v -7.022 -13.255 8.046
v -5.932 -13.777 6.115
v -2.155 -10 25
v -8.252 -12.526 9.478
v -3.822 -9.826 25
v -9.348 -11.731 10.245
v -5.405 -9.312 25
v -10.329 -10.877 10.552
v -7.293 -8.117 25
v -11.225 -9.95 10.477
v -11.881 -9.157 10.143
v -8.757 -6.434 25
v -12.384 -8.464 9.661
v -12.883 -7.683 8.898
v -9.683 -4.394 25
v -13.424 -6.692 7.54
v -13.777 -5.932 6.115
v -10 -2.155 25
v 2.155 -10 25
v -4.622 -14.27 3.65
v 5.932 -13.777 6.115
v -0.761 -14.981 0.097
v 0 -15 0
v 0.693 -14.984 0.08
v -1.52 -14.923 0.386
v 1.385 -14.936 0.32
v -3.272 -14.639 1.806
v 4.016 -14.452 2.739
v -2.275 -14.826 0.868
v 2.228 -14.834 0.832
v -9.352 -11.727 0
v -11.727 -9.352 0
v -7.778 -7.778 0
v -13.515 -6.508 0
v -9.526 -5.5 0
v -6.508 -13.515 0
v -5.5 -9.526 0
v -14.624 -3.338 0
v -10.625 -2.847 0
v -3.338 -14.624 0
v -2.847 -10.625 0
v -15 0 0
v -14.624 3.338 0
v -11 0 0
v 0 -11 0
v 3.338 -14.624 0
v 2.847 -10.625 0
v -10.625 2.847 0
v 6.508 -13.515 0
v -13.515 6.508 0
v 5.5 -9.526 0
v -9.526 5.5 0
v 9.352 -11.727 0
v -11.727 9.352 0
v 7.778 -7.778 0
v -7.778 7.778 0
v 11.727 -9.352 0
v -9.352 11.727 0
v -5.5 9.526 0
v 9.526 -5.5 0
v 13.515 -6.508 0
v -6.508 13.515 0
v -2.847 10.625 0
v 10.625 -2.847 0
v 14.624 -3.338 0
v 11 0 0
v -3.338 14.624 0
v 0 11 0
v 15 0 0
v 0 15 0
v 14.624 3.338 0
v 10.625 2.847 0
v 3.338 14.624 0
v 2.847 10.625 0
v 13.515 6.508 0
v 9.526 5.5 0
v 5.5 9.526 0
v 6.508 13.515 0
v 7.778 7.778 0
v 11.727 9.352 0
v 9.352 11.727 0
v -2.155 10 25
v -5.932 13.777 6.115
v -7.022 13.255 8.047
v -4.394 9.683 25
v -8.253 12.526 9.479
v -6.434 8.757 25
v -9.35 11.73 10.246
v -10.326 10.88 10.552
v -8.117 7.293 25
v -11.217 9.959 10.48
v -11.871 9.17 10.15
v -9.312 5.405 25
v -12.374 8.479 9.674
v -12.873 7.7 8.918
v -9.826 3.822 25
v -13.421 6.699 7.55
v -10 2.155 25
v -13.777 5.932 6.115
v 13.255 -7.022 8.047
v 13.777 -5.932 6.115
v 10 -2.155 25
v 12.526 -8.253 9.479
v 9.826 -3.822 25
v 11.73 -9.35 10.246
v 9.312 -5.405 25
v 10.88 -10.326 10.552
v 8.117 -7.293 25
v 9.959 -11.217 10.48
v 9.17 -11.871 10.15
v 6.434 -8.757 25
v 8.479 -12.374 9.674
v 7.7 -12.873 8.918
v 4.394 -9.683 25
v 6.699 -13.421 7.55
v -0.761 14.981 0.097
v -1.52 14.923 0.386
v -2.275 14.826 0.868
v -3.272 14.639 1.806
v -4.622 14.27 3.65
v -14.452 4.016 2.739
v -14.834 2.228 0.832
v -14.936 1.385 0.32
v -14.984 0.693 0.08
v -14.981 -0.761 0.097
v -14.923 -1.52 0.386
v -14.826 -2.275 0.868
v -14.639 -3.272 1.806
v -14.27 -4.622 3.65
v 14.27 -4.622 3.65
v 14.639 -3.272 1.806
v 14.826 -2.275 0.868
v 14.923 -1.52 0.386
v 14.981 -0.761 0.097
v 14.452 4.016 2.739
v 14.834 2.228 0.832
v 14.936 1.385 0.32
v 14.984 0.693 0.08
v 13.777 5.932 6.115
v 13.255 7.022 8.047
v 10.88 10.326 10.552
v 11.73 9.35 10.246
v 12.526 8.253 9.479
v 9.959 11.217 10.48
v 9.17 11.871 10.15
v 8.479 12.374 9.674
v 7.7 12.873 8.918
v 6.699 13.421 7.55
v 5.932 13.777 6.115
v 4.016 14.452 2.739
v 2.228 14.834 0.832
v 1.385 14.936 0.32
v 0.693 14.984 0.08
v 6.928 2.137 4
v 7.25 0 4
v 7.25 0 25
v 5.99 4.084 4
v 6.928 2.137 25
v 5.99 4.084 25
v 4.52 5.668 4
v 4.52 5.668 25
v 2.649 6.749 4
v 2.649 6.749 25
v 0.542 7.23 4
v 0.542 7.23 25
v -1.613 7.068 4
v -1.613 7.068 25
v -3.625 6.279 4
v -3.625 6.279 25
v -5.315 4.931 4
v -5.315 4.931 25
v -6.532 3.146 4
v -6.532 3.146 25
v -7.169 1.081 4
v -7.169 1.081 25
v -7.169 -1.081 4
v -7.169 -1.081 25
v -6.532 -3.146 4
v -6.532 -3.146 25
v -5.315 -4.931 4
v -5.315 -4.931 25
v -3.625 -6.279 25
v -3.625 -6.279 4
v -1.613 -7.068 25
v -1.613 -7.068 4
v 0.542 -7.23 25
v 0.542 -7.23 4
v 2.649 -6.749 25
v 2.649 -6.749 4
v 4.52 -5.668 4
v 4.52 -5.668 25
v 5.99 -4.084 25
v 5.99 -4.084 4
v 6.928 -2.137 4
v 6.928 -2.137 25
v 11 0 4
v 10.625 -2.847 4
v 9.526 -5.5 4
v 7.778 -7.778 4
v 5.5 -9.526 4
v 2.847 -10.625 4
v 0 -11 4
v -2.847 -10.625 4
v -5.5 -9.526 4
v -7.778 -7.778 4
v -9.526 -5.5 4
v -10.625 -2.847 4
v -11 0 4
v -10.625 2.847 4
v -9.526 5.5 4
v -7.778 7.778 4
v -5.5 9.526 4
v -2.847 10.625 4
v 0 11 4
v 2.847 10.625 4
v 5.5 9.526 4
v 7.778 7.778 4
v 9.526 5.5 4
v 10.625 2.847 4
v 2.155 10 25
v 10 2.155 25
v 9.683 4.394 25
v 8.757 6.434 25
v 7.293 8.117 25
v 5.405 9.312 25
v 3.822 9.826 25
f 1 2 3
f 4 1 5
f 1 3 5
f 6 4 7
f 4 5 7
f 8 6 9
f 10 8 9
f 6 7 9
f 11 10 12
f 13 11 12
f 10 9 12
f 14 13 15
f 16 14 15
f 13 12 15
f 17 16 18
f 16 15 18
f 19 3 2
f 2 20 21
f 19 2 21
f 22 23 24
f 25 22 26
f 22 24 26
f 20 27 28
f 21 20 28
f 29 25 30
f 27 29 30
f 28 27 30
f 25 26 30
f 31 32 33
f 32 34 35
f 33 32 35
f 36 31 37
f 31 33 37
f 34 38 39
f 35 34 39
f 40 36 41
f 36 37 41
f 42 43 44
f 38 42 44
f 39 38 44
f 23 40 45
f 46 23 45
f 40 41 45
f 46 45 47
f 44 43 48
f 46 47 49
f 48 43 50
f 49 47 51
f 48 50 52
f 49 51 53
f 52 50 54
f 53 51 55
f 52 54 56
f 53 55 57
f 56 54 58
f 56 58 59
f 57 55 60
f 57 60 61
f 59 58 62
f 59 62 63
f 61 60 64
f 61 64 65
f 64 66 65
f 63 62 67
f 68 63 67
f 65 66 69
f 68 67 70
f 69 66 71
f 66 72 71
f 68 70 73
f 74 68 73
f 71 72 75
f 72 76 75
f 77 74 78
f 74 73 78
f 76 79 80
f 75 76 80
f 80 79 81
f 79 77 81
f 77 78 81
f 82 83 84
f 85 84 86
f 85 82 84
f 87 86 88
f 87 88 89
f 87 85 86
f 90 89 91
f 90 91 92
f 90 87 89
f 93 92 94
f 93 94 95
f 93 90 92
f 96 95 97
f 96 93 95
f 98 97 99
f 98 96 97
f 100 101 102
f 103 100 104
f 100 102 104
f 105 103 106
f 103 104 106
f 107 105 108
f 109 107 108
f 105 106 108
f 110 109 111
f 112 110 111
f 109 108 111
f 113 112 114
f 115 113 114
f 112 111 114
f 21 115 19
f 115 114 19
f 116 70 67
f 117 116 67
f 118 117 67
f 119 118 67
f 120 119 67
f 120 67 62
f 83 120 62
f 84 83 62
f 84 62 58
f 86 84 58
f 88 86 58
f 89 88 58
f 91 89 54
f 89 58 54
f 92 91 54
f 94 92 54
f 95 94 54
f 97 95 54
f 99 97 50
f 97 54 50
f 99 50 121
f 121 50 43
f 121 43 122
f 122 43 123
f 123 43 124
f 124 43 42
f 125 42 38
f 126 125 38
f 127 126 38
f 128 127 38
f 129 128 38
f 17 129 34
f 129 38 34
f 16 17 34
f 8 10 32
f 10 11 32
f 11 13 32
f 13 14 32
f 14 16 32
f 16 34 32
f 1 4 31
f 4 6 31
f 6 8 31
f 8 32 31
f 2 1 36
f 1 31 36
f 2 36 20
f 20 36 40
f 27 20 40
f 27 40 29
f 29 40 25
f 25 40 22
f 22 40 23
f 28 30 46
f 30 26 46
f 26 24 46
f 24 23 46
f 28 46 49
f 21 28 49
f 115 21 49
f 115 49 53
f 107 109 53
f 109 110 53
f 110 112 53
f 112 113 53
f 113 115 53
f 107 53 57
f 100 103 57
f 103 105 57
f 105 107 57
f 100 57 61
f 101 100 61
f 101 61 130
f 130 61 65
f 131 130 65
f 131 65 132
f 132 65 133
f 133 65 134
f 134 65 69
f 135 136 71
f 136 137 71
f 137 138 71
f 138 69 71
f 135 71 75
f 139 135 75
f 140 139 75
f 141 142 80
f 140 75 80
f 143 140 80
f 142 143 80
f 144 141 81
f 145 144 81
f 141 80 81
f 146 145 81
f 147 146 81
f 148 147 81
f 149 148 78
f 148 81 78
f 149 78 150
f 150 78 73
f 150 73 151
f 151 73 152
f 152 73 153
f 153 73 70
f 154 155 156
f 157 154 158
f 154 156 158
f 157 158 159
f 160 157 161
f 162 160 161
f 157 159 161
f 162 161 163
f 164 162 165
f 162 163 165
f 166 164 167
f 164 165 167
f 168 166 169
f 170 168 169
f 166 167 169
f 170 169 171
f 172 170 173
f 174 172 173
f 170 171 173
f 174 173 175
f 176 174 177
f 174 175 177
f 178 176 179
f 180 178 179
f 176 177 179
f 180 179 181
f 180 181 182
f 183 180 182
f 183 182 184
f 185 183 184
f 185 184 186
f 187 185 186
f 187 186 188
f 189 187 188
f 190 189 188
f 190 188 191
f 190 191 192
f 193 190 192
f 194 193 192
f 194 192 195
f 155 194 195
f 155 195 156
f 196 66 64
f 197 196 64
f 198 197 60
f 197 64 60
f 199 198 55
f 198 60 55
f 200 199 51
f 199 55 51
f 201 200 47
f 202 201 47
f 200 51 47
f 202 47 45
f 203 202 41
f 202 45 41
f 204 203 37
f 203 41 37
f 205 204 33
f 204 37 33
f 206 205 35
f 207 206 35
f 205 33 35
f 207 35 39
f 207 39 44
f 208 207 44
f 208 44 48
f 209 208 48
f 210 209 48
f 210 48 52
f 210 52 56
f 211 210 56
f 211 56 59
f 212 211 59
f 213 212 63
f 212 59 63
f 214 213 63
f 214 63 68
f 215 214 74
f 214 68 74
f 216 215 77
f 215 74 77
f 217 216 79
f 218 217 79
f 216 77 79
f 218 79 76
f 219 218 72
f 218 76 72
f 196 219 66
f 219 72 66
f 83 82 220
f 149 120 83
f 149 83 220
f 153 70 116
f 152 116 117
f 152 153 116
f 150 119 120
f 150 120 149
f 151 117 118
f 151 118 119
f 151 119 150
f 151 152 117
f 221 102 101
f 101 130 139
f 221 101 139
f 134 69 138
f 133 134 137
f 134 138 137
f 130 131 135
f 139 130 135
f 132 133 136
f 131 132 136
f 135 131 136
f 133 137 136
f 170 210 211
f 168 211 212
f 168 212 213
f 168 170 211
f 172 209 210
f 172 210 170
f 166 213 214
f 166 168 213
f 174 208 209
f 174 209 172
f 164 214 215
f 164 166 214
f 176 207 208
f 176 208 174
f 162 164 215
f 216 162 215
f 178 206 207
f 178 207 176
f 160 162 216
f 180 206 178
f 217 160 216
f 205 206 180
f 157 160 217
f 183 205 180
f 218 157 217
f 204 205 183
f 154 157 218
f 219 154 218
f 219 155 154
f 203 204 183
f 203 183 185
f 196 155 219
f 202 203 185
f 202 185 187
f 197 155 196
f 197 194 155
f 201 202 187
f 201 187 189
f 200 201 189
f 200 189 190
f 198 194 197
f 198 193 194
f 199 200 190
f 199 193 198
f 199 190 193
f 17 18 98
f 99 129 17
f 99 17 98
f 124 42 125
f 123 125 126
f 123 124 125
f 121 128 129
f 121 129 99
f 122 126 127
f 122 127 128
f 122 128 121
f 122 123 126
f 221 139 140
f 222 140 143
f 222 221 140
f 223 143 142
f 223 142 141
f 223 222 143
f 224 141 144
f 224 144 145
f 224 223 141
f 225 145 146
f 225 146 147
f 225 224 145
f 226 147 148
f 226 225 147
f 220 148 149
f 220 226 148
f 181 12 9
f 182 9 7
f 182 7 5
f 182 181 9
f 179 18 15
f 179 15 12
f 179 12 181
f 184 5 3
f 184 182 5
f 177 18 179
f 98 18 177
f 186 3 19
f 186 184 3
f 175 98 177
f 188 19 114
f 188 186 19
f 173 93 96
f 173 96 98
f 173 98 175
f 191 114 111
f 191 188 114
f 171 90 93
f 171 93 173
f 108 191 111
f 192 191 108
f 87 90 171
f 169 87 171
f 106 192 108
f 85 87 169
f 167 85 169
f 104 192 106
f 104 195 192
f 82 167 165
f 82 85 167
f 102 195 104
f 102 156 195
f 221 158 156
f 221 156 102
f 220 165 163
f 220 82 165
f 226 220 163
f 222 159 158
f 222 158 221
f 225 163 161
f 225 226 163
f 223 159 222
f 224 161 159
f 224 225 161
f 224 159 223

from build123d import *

# Parameters (mm, degrees)
F0_W        = 30
F0_H        = 30
F1_DEPTH    = 25
F2_R        = 7.25
F3_DEPTH    = 25
F4_SIZE2    = 24.99999
F4_SIZE     = 4.99999
F5_T1_DEPTH = 102.9607936575
F5_T3_DEPTH = 102.9607936575
F5_T5_DEPTH = 102.9607936575
F5_T7_DEPTH = 102.9607936575
F7_DEPTH    = 25
F8_R        = 11
F9_DEPTH    = 4


# Not quite as in the source:
# - a fillet or chamfer that OpenCascade refuses, or shapes differently, is made with other operations: its cross-section is extruded or revolved along the edge and cut away or added
# - a fillet or chamfer is up to 0.001 mm smaller than in the source, because OpenCascade refuses the exact size


with BuildPart() as f1:
    # F0 (on Top) → F1 (new body)
    with BuildSketch(Plane.XY):
        Rectangle(F0_W, F0_H)
    extrude(amount=F1_DEPTH)

    # F2 (on face) → F3 (cut)
    with BuildSketch(Plane.XY.offset(25)):
        Circle(F2_R)
    extrude(amount=-F3_DEPTH, mode=Mode.SUBTRACT)

    # F4 (size 5 and 25 in the source; OpenCascade refuses exactly that, so slightly less here)
    f4_edges = [f1.edges().sort_by_distance(p)[0] for p in [
        (15, 0, 25),
        (0, 15, 25),
        (-15, 0, 25),
        (0, -15, 25),
    ]]
    f4_side = f1.faces().sort_by_distance((14.575736, 0, 25))[0]
    chamfer(f4_edges, length=F4_SIZE, length2=F4_SIZE2, reference=f4_side)

    # F5: fillet of radius 8 on 4 edges, made by hand

    # F5_s2 → F5_t1 (cut)
    with BuildSketch(Plane(origin=(-7.5925826886, 7.5925826886, 37.9629741838), x_dir=(0.7071067812, 0.7071067812, 0), z_dir=(0.1924498046, -0.1924498046, -0.9622505627))):
        with BuildLine():
            ThreePointArc((5.5470023036, 15.0748135762), (0, 17.3102003677), (-5.5470023036, 15.0748135762))
            Line((-5.5470023036, 15.0748135762), (0, 20.4124196641))
            Line((0, 20.4124196641), (5.5470023036, 15.0748135762))
        make_face()
    extrude(amount=F5_T1_DEPTH, mode=Mode.SUBTRACT)

    # F5_s4 → F5_t3 (cut)
    with BuildSketch(Plane(origin=(-7.5925826886, -7.5925826886, 37.9629741838), x_dir=(-0.7071067812, 0.7071067812, 0), z_dir=(0.1924498046, 0.1924498046, -0.9622505627))):
        with BuildLine():
            ThreePointArc((-5.5470023036, 15.0748135762), (0, 17.3102003677), (5.5470023036, 15.0748135762))
            Line((5.5470023036, 15.0748135762), (0, 20.4124196641))
            Line((0, 20.4124196641), (-5.5470023036, 15.0748135762))
        make_face()
    extrude(amount=F5_T3_DEPTH, mode=Mode.SUBTRACT)

    # F5_s6 → F5_t5 (cut)
    with BuildSketch(Plane(origin=(7.5925826886, -7.5925826886, 37.9629741838), x_dir=(-0.7071067812, -0.7071067812, 0), z_dir=(-0.1924498046, 0.1924498046, -0.9622505627))):
        with BuildLine():
            ThreePointArc((-5.5470023036, 15.0748135762), (0, 17.3102003677), (5.5470023036, 15.0748135762))
            Line((5.5470023036, 15.0748135762), (0, 20.4124196641))
            Line((0, 20.4124196641), (-5.5470023036, 15.0748135762))
        make_face()
    extrude(amount=F5_T5_DEPTH, mode=Mode.SUBTRACT)

    # F5_s8 → F5_t7 (cut)
    with BuildSketch(Plane(origin=(7.5925826886, 7.5925826886, 37.9629741838), x_dir=(0.7071067812, -0.7071067812, 0), z_dir=(-0.1924498046, -0.1924498046, -0.9622505627))):
        with BuildLine():
            ThreePointArc((5.5470023036, 15.0748135762), (0, 17.3102003677), (-5.5470023036, 15.0748135762))
            Line((-5.5470023036, 15.0748135762), (0, 20.4124196641))
            Line((0, 20.4124196641), (5.5470023036, 15.0748135762))
        make_face()
    extrude(amount=F5_T7_DEPTH, mode=Mode.SUBTRACT)

    # F6 (on face) → F7 (cut)
    with BuildSketch(Plane(origin=(0, 0, 0), x_dir=(1, 0, 0), z_dir=(0, 0, -1))):
        with BuildLine():
            ThreePointArc((0, 15), (10.6066017178, 10.6066017178), (15, 0))
            Line((15, 0), (15, 7.1610644072))
            add(Edge.make_bspline(
                [(7.1610644072, 15), (14.9945107468, 14.9945107468), (15, 7.1610644072)],
                knots=[2.3761301528, 2.3761301528, 2.3761301528, 3.9070551544, 3.9070551544, 3.9070551544], degree=2, weights=[1, 0.7210619814, 1]))
            Line((7.1610644072, 15), (0, 15))
        make_face()
        with BuildLine():
            ThreePointArc((-15, 0), (-10.6066017178, 10.6066017178), (0, 15))
            Line((0, 15), (-7.1610644072, 15))
            add(Edge.make_bspline(
                [(-15, 7.1610644072), (-14.9945107468, 14.9945107468), (-7.1610644072, 15)],
                knots=[2.3761301528, 2.3761301528, 2.3761301528, 3.9070551544, 3.9070551544, 3.9070551544], degree=2, weights=[1, 0.7210619814, 1]))
            Line((-15, 7.1610644072), (-15, 0))
        make_face()
        with BuildLine():
            Line((-7.1610644072, -15), (0, -15))
            ThreePointArc((0, -15), (-10.6066017178, -10.6066017178), (-15, 0))
            Line((-15, 0), (-15, -7.1610644072))
            add(Edge.make_bspline(
                [(-7.1610644072, -15), (-14.9945107468, -14.9945107468), (-15, -7.1610644072)],
                knots=[2.3761301528, 2.3761301528, 2.3761301528, 3.9070551544, 3.9070551544, 3.9070551544], degree=2, weights=[1, 0.7210619814, 1]))
        make_face()
        with BuildLine():
            Line((15, -7.1610644072), (15, 0))
            ThreePointArc((15, 0), (10.6066017178, -10.6066017178), (0, -15))
            Line((0, -15), (7.1610644072, -15))
            add(Edge.make_bspline(
                [(15, -7.1610644072), (14.9945107468, -14.9945107468), (7.1610644072, -15)],
                knots=[2.3761301528, 2.3761301528, 2.3761301528, 3.9070551544, 3.9070551544, 3.9070551544], degree=2, weights=[1, 0.7210619814, 1]))
        make_face()
    extrude(amount=-F7_DEPTH, mode=Mode.SUBTRACT)

    # F8 (on face) → F9 (cut)
    with BuildSketch(Plane(origin=(0, 0, 0), x_dir=(1, 0, 0), z_dir=(0, 0, -1))):
        Circle(F8_R)
    extrude(amount=-F9_DEPTH, mode=Mode.SUBTRACT)


solid = f1.part
